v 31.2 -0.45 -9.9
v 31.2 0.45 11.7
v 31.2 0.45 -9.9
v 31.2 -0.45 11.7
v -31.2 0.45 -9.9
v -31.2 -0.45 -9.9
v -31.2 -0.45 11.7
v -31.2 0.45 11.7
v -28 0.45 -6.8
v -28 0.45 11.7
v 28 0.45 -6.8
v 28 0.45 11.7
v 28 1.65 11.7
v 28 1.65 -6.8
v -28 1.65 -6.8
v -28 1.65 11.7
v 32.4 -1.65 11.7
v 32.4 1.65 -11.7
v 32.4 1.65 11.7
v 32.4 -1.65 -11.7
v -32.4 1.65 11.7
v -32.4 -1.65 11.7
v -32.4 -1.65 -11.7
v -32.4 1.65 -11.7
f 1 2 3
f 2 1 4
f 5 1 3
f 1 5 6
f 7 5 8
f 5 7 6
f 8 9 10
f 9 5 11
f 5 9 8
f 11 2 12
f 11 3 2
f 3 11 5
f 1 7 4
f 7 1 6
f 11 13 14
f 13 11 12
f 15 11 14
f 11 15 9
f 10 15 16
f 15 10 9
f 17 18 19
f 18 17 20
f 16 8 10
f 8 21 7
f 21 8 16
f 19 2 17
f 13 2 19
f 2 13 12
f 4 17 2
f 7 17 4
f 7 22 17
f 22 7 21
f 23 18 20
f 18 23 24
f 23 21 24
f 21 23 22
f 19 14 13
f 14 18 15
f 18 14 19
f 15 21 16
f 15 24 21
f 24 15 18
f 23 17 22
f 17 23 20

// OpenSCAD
//
// Parametric Label Holder for Drawers and Cupboards
//
// The label holder can be configured for different paper label
// sizes. It can be made as a glue-on holder using the whole of
// its back or only a part of it for attaching a double-sided
// adhesive tape, or it can be made as a screw-on holder, either
// using flat-headed screws or conical-headed screws (eg. SPAX).
//
// Remarks:
//
// Example parameters for Leitz 1900/1901 labels:
//  - LabelWidth     = 62;
//  - LabelHeight    = 22;
//  - LabelThickness = 0.5;
//
// Choose the label thickness so that the label sits firmly but
// the printer can manage to keep front and back apart.
//
// Choose the wall thickness so that it is a multiple of your
// printer's nozzle width (most printers use 0.4mm nozzles).
//
// When using screw mounts, choose a wall-thickness that adds
// to the stability (especially when using a power screwdriver
// to mount the label holders).
//
// Print upright with ground supports.
// Print with supports when printing a screw-on holder.
//
// TODO:
//   - Option to have a top frame (requires print with supports)
//     Might add a nice look to the whole thing
//   - Bug fixes (yes, there still may be some of those critters)
//   - Option for "clip-on" label holders (eg. heavy-duty racks)
//   - Round front edges on all designs for smoother look
//   - Smoothen egdes on label window
//   - Optional: Make label window a trapezoid
//
// Kudos to:
//   - mbrembati for his idea to turn it into a handle and his improvements to
//     the customizer interface.
//
//
// $Id: Parametric_Labelholder.scad,v 1.6 2019/10/21 09:13:34 tneuer Exp tneuer $
//
// $Log: Parametric_Labelholder.scad,v $
// Revision 1.6  2019/10/21 09:13:34  tneuer
// Added assertion for parameters.
//
// Revision 1.5  2019/10/16 15:59:36  tneuer
// Bugfix: Conical screws where misaligned when rendering the stand-off
// handle variant.
//
// Revision 1.4  2019/10/16 15:34:27  tneuer
// Changed design of grip to make it look more appealing and perhaps
// also a bit stronger.
//
// Revision 1.3  2019/10/15 15:59:08  tneuer
// Merged code from mbrembati (Improvements to the customizer interface plus
// stand-off handle type), bug-fixes and code cleanup.
//
// Revision 1.2  2019/10/15 11:07:35  tneuer
// Added optional handle. The handle is only available for the screw-on
// variant of the label holder as the glue-on variant might not hold as
// good on the labelled compartment.
//
// Revision 1.1  2019/10/15 11:01:15  tneuer
// Initial revision
//
//

/* [ Main Dimensions ] */
// Width of paper label (mm)
LabelWidth     = 62;
// Height of paper label (mm)
LabelHeight    = 22;
// Thickness of paper label (mm)
LabelThickness = 0.5;
// Thickness of label holder walls (mm)
WallThickness  = 1.2;
// Are we using screws to mount it ?
UseScrews      = 0; // [0:false, 1:true]

/* [ Screw-On Variant ] */
// Diameter of screw used (mm)
ScrewDiameter  = 4.0;
// Are you using a flat headed screw (true) or conical (false) ?
FlatheadScrew  = 0; // [0:false, 1:true]
// Diameter of screw head (mm)
HeadDiameter   = 6.0;
// Head height for conical screw heads (mm)
HeadHeight     = 2.0;
// Type of handle
HandleType     = 2;  // [0:none, 1:grip, 2:stand-off]
// Stand-off for using as handle (type=2) (mm)
SpacerHeight   = 15; // [0:50]

/* [ Glue-On Variant ] */
// For thicker double-sided tape and/or tape that cannot cover the
// total height of the label holder, it might be nice to cut out a
// small rail in the back for the tape...
// Width of double-sided tape (mm)
TapeWidth      = 25.0;
// Thickness of double-sided tape (mm)
TapeThickness  = 0.0;

/* [ Optional Parameters ] */
// The following are optional configurational parameters.
// You will probably not have to change those.
// Width of window frame (mm)
FrameBorder    = 3.0;
// Extra padding for paper label (mm)
Padding        = 0.2;


// Private Data
// Don't change anything below here except you're me!

/* [Hidden] */
// for smooth geometry...
$fs = 0.1;
$fa = 5;

function OuterBoxWidth() = WallThickness * 2.0 + Padding * 2.0 + LabelWidth;
function OuterBoxHeight() = WallThickness + Padding + LabelHeight;
function OuterBoxThickness() = WallThickness * 2.0 + Padding * 2.0 + LabelThickness;
function GripOffset() = OuterBoxHeight()-(LabelHeight/2-(FrameBorder+WallThickness));
function StandOff() = HandleType == 2 ? SpacerHeight : 0;


module screw_head() {       // seating for a screw (if any)
    if( FlatheadScrew ) {
        translate( [ 0, 0, -(OuterBoxThickness()/2.0 + StandOff()/2.0 - WallThickness/2.0) ] )
            cylinder( WallThickness, 
                      d = HeadDiameter, 
                      center = true );
    } else {
        translate( [ 0, 0, -(OuterBoxThickness()/2.0 + StandOff()/2.0 - HeadHeight/2.0) ] )
            cylinder( HeadHeight,
                      d1 = HeadDiameter, 
                      d2 = ScrewDiameter,
                      center = true );
    }
}


module screw_hole() {       // channel for a screw to fit through (if any)
    translate( [ OuterBoxHeight() / 4.0, 0, StandOff() / 2 ] )
        union () {
            cylinder( OuterBoxThickness()+StandOff(), 
                      d = ScrewDiameter, 
                      center = true );
            screw_head();
        }
}


module screw_mount() {      // half-cylinder with hole for screw-on
    rotate( [ 90, 0, 0 ] )  // mounting (if any)
        difference() {
            translate( [ 0, 0, StandOff() / 2 ] )
                cylinder( OuterBoxThickness() + StandOff(),
                        d = OuterBoxHeight(),
                        center = true );
            if( HandleType == 2 ) {
                translate( [-OuterBoxHeight() / 2, 0, StandOff() / 2 ] )
                    cube( [ OuterBoxHeight(), 
                            OuterBoxHeight(),
                            OuterBoxThickness() + StandOff() ], center = true );
            }
            screw_hole();
        }
}


module screw_mounts() {     // place screw mount plates on both sides
    if( UseScrews ) {       // (if any screws used)
        SideOffset = LabelWidth / 2.0 + WallThickness + Padding;
        translate( [ SideOffset, 0, 0 ] )
            screw_mount();
        translate( [ -SideOffset, 0, 0 ] )
            rotate( [ 0, 180, 0 ] )
                screw_mount();
    }
}


module grip() {
    if( HandleType == 1 &&  // Would we like to have a handle as well ?
        UseScrews  ) {      // Only with screw-on for strength
        translate( [ 0, 0, -GripOffset() ] )
            rotate( [ 0, 90, 0 ] )
                difference() {
                    union() {
                        translate( [ 0, 0, OuterBoxWidth() / 2 - 10 ] )
                            sphere( d = 20 );
                        cylinder( h = OuterBoxWidth() - 20, d = 20, center = true );
                        translate( [ 0, 0, -(OuterBoxWidth() / 2 - 10) ] )
                            sphere( d = 20 );
                    }
                    union() {
                        translate( [ 0, 0, OuterBoxWidth() / 2 - 10 ] )
                            sphere( d = 20 - WallThickness*2 );
                        cylinder( h = LabelWidth-20, d = 20-WallThickness*2, center = true );
                        translate( [ 0, 0, -(OuterBoxWidth() / 2 - 10) ] )
                            sphere( d = 20 - WallThickness*2 );
                        translate( [ 5, 0, 0 ] )
                            cube( [ 10, 20, OuterBoxWidth() ], center = true );
                        translate( [ -5, -(5 + OuterBoxThickness() / 2) , 0 ] )
                            cube( [ 10, 10, OuterBoxWidth() ], center = true );
                    }
                }
    }
}


module label_box() {        // space where the paper label slides in
    translate( [ 0, 
                 0, 
                 WallThickness ] )
        cube( [ Padding * 2.0 + LabelWidth,
                Padding * 2.0 + LabelThickness,
                Padding + LabelHeight ], center = true );
}


module label_window() {     // front bezel - what is visible of the
    translate( [ 0,         // paper label
                 WallThickness / 2.0 + Padding + LabelThickness / 2.0, 
                 WallThickness + FrameBorder / 2 ] )
        cube( [ LabelWidth - FrameBorder * 2.0,
                WallThickness + Padding,
                LabelHeight - FrameBorder ], center = true );
}


module tape_rail() {        // when using glue-on method, this is where
    if( !UseScrews &&       // the double-sided adhesive tape is placed
        (TapeThickness > 0) &&
        (TapeWidth > 0) && (TapeWidth < OuterBoxHeight()) ) {
        BackOffset = (WallThickness + Padding + LabelThickness / 2.0) - (TapeThickness / 2.0);
        translate( [ 0, -BackOffset, 0 ] )
            cube( [ OuterBoxWidth(),
                    TapeThickness,
                    TapeWidth ], center = true );
    }
}


if( UseScrews ) {
    assert( ScrewDiameter > 0.5,
            "ScrewDiameter too small for UseScrews." );
    assert( OuterBoxHeight() / 2.0 > HeadDiameter,
            "HeadDiameter too large." );
    if( FlatheadScrew ) {
        assert( OuterBoxThickness() > HeadHeight,
                "HeadHeight too large." );
    }
}

difference() {              // main body
    union() {
        // outer box
        cube( [ OuterBoxWidth(),
                OuterBoxThickness(),
                OuterBoxHeight() ], center = true );
        screw_mounts();
        grip();
    }
    union() {
        label_box();
        label_window();
        tape_rail();
    }
}
